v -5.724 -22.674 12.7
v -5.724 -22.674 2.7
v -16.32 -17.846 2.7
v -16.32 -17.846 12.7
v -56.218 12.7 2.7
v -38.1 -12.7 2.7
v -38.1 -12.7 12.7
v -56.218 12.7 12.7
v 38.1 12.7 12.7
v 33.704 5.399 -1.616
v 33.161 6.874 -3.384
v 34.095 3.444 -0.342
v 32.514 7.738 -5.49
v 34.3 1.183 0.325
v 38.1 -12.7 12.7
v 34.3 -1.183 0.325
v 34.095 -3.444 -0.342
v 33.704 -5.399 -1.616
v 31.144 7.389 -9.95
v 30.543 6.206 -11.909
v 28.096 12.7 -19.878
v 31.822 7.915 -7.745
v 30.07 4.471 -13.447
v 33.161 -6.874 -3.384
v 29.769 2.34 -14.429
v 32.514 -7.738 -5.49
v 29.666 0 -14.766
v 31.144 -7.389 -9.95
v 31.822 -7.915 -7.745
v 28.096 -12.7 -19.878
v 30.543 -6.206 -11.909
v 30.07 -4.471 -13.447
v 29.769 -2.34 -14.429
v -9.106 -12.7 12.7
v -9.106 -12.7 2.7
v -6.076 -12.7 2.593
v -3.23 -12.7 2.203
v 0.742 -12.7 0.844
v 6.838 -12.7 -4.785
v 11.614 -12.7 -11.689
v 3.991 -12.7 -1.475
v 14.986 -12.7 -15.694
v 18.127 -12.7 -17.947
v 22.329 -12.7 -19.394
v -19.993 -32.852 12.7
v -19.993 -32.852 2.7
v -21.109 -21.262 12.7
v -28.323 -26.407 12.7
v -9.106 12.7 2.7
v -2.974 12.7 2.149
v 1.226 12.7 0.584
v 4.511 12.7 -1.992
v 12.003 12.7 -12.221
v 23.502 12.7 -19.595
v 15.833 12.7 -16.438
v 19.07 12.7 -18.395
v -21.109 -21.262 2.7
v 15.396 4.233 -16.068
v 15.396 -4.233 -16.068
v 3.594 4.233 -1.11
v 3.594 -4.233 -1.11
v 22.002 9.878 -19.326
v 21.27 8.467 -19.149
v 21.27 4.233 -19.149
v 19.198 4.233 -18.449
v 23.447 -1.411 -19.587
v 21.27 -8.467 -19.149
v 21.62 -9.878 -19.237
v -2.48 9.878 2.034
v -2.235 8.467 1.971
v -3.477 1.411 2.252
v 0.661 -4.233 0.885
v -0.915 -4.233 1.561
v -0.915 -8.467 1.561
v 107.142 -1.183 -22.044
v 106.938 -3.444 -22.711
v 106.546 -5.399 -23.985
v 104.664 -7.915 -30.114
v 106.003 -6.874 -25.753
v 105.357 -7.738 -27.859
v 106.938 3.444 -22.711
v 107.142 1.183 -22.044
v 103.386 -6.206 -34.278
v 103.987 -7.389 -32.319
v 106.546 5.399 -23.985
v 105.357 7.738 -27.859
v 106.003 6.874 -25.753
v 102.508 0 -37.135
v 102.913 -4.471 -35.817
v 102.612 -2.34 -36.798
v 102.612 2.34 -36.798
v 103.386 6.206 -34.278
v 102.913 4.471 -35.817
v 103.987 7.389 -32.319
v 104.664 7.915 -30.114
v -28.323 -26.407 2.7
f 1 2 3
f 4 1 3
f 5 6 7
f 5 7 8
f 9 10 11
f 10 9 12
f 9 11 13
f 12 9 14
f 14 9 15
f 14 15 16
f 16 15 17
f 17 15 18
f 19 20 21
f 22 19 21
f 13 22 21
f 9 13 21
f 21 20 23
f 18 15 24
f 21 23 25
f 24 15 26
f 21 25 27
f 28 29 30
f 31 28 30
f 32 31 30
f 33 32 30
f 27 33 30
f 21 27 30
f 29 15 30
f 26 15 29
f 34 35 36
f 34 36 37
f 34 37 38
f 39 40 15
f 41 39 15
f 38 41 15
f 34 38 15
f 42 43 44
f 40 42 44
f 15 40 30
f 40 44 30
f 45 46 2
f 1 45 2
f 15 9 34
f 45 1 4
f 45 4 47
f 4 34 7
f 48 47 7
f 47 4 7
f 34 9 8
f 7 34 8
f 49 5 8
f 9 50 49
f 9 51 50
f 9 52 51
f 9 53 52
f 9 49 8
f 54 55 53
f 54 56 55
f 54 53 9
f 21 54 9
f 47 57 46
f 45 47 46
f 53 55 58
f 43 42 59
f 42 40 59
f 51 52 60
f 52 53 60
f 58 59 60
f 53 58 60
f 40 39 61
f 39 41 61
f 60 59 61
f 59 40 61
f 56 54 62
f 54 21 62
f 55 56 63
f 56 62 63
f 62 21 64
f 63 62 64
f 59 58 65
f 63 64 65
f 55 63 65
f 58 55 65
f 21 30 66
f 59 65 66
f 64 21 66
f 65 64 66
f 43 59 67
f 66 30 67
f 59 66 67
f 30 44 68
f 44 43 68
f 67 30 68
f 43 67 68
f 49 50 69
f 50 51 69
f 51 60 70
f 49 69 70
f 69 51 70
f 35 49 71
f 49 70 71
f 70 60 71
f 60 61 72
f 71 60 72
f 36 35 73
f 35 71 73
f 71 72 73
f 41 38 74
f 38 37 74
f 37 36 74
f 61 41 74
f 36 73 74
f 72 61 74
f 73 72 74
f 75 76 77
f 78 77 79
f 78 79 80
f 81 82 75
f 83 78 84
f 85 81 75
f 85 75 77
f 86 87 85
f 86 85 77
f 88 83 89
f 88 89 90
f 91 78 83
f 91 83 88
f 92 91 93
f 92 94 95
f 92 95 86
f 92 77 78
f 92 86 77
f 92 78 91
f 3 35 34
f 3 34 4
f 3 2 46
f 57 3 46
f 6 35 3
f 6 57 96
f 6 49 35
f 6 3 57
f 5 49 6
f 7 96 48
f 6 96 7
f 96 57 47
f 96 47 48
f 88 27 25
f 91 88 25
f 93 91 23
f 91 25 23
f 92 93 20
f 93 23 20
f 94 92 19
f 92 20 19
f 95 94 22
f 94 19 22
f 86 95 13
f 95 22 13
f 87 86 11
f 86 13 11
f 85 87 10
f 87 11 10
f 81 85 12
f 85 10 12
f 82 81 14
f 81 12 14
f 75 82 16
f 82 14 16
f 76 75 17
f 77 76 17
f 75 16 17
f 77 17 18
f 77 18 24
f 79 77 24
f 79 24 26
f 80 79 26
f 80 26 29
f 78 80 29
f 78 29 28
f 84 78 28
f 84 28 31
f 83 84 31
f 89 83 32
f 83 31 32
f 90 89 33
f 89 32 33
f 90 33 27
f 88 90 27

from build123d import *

# Parameters (mm, degrees)
BOSS_EXTRUDE1_DEPTH      = 12.7
BOSS_EXTRUDE1_DEPTH_BACK = 19.878167
SKETCH1_W                = 76.2
SKETCH1_H                = 25.4
CUT_EXTRUDE1_DEPTH       = 50.919049703
SKETCH4_R                = 7.9375
BOSS_EXTRUDE2_DEPTH      = 76.2
BOSS_EXTRUDE3_DEPTH      = 10


with BuildPart() as part:
    # Sketch1 → Boss-Extrude1 (new, two sides: drawn at the far end of the back side and taken through both)
    with BuildSketch(Plane.XY.offset(-BOSS_EXTRUDE1_DEPTH_BACK)):
        Rectangle(SKETCH1_W, SKETCH1_H)
    extrude(amount=BOSS_EXTRUDE1_DEPTH + BOSS_EXTRUDE1_DEPTH_BACK)

    # Sketch2 → Cut-Extrude1 (cut, through all)
    with BuildSketch(Plane.XZ.offset(12.7)):
        Polygon((33.097822487, -3.5890835), (28.095644974, -19.878167), (30.299971912, -19.878167), (38.1, -19.878167), (38.1, -5.125190787), align=None)
        Polygon((38.1, 12.7), (33.097822487, -3.5890835), (38.1, -5.125190787), align=None)
        with BuildLine():
            Line((28.095644974, -19.878167), (-38.1, -19.878167))
            Line((-38.1, -19.878167), (-38.1, 2.7))
            Line((-38.1, 2.7), (-9.105646135, 2.7))
            add(Edge.make_bspline(
                [(28.095644974, -19.878167), (23.262476233, -19.878167), (13.759725723, -18.38827049), (5.19295176, 1.21010349), (-4.185142014, 2.7), (-9.105646135, 2.7)],
                knots=[0, 0, 0, 0, 0.311689084, 0.688310916, 1, 1, 1, 1], degree=3))
        make_face()
    extrude(amount=-CUT_EXTRUDE1_DEPTH, mode=Mode.SUBTRACT)

    # Sketch4 → Boss-Extrude2 (add)
    with BuildSketch(Plane(origin=(31.252760971, 0, -9.59733911), x_dir=(-0.2935578385035089, 0, -0.95594131381228), z_dir=(0.95594131381228, 0, -0.2935578385035089))):
        with Locations((-2.530674188, 0)):
            Circle(SKETCH4_R)
    extrude(amount=BOSS_EXTRUDE2_DEPTH)

    # Sketch5 → Boss-Extrude3 (add)
    with BuildSketch(Plane(origin=(0, 0, 2.7), x_dir=(-1, 0, 0), z_dir=(0, 0, -1))):
        Polygon((9.105646135, -12.7), (28.322642206, -26.407350084), (38.1, -12.7), align=None)
        Polygon((38.1, -12.7), (56.217643925, 12.7), (38.1, 12.7), align=None)
        Polygon((16.319736518, -17.845760662), (21.108551823, -21.261589422), (19.992545993, -32.851753107), (5.724357418, -22.674353105), align=None)
    extrude(amount=-BOSS_EXTRUDE3_DEPTH)


solid = part.part
